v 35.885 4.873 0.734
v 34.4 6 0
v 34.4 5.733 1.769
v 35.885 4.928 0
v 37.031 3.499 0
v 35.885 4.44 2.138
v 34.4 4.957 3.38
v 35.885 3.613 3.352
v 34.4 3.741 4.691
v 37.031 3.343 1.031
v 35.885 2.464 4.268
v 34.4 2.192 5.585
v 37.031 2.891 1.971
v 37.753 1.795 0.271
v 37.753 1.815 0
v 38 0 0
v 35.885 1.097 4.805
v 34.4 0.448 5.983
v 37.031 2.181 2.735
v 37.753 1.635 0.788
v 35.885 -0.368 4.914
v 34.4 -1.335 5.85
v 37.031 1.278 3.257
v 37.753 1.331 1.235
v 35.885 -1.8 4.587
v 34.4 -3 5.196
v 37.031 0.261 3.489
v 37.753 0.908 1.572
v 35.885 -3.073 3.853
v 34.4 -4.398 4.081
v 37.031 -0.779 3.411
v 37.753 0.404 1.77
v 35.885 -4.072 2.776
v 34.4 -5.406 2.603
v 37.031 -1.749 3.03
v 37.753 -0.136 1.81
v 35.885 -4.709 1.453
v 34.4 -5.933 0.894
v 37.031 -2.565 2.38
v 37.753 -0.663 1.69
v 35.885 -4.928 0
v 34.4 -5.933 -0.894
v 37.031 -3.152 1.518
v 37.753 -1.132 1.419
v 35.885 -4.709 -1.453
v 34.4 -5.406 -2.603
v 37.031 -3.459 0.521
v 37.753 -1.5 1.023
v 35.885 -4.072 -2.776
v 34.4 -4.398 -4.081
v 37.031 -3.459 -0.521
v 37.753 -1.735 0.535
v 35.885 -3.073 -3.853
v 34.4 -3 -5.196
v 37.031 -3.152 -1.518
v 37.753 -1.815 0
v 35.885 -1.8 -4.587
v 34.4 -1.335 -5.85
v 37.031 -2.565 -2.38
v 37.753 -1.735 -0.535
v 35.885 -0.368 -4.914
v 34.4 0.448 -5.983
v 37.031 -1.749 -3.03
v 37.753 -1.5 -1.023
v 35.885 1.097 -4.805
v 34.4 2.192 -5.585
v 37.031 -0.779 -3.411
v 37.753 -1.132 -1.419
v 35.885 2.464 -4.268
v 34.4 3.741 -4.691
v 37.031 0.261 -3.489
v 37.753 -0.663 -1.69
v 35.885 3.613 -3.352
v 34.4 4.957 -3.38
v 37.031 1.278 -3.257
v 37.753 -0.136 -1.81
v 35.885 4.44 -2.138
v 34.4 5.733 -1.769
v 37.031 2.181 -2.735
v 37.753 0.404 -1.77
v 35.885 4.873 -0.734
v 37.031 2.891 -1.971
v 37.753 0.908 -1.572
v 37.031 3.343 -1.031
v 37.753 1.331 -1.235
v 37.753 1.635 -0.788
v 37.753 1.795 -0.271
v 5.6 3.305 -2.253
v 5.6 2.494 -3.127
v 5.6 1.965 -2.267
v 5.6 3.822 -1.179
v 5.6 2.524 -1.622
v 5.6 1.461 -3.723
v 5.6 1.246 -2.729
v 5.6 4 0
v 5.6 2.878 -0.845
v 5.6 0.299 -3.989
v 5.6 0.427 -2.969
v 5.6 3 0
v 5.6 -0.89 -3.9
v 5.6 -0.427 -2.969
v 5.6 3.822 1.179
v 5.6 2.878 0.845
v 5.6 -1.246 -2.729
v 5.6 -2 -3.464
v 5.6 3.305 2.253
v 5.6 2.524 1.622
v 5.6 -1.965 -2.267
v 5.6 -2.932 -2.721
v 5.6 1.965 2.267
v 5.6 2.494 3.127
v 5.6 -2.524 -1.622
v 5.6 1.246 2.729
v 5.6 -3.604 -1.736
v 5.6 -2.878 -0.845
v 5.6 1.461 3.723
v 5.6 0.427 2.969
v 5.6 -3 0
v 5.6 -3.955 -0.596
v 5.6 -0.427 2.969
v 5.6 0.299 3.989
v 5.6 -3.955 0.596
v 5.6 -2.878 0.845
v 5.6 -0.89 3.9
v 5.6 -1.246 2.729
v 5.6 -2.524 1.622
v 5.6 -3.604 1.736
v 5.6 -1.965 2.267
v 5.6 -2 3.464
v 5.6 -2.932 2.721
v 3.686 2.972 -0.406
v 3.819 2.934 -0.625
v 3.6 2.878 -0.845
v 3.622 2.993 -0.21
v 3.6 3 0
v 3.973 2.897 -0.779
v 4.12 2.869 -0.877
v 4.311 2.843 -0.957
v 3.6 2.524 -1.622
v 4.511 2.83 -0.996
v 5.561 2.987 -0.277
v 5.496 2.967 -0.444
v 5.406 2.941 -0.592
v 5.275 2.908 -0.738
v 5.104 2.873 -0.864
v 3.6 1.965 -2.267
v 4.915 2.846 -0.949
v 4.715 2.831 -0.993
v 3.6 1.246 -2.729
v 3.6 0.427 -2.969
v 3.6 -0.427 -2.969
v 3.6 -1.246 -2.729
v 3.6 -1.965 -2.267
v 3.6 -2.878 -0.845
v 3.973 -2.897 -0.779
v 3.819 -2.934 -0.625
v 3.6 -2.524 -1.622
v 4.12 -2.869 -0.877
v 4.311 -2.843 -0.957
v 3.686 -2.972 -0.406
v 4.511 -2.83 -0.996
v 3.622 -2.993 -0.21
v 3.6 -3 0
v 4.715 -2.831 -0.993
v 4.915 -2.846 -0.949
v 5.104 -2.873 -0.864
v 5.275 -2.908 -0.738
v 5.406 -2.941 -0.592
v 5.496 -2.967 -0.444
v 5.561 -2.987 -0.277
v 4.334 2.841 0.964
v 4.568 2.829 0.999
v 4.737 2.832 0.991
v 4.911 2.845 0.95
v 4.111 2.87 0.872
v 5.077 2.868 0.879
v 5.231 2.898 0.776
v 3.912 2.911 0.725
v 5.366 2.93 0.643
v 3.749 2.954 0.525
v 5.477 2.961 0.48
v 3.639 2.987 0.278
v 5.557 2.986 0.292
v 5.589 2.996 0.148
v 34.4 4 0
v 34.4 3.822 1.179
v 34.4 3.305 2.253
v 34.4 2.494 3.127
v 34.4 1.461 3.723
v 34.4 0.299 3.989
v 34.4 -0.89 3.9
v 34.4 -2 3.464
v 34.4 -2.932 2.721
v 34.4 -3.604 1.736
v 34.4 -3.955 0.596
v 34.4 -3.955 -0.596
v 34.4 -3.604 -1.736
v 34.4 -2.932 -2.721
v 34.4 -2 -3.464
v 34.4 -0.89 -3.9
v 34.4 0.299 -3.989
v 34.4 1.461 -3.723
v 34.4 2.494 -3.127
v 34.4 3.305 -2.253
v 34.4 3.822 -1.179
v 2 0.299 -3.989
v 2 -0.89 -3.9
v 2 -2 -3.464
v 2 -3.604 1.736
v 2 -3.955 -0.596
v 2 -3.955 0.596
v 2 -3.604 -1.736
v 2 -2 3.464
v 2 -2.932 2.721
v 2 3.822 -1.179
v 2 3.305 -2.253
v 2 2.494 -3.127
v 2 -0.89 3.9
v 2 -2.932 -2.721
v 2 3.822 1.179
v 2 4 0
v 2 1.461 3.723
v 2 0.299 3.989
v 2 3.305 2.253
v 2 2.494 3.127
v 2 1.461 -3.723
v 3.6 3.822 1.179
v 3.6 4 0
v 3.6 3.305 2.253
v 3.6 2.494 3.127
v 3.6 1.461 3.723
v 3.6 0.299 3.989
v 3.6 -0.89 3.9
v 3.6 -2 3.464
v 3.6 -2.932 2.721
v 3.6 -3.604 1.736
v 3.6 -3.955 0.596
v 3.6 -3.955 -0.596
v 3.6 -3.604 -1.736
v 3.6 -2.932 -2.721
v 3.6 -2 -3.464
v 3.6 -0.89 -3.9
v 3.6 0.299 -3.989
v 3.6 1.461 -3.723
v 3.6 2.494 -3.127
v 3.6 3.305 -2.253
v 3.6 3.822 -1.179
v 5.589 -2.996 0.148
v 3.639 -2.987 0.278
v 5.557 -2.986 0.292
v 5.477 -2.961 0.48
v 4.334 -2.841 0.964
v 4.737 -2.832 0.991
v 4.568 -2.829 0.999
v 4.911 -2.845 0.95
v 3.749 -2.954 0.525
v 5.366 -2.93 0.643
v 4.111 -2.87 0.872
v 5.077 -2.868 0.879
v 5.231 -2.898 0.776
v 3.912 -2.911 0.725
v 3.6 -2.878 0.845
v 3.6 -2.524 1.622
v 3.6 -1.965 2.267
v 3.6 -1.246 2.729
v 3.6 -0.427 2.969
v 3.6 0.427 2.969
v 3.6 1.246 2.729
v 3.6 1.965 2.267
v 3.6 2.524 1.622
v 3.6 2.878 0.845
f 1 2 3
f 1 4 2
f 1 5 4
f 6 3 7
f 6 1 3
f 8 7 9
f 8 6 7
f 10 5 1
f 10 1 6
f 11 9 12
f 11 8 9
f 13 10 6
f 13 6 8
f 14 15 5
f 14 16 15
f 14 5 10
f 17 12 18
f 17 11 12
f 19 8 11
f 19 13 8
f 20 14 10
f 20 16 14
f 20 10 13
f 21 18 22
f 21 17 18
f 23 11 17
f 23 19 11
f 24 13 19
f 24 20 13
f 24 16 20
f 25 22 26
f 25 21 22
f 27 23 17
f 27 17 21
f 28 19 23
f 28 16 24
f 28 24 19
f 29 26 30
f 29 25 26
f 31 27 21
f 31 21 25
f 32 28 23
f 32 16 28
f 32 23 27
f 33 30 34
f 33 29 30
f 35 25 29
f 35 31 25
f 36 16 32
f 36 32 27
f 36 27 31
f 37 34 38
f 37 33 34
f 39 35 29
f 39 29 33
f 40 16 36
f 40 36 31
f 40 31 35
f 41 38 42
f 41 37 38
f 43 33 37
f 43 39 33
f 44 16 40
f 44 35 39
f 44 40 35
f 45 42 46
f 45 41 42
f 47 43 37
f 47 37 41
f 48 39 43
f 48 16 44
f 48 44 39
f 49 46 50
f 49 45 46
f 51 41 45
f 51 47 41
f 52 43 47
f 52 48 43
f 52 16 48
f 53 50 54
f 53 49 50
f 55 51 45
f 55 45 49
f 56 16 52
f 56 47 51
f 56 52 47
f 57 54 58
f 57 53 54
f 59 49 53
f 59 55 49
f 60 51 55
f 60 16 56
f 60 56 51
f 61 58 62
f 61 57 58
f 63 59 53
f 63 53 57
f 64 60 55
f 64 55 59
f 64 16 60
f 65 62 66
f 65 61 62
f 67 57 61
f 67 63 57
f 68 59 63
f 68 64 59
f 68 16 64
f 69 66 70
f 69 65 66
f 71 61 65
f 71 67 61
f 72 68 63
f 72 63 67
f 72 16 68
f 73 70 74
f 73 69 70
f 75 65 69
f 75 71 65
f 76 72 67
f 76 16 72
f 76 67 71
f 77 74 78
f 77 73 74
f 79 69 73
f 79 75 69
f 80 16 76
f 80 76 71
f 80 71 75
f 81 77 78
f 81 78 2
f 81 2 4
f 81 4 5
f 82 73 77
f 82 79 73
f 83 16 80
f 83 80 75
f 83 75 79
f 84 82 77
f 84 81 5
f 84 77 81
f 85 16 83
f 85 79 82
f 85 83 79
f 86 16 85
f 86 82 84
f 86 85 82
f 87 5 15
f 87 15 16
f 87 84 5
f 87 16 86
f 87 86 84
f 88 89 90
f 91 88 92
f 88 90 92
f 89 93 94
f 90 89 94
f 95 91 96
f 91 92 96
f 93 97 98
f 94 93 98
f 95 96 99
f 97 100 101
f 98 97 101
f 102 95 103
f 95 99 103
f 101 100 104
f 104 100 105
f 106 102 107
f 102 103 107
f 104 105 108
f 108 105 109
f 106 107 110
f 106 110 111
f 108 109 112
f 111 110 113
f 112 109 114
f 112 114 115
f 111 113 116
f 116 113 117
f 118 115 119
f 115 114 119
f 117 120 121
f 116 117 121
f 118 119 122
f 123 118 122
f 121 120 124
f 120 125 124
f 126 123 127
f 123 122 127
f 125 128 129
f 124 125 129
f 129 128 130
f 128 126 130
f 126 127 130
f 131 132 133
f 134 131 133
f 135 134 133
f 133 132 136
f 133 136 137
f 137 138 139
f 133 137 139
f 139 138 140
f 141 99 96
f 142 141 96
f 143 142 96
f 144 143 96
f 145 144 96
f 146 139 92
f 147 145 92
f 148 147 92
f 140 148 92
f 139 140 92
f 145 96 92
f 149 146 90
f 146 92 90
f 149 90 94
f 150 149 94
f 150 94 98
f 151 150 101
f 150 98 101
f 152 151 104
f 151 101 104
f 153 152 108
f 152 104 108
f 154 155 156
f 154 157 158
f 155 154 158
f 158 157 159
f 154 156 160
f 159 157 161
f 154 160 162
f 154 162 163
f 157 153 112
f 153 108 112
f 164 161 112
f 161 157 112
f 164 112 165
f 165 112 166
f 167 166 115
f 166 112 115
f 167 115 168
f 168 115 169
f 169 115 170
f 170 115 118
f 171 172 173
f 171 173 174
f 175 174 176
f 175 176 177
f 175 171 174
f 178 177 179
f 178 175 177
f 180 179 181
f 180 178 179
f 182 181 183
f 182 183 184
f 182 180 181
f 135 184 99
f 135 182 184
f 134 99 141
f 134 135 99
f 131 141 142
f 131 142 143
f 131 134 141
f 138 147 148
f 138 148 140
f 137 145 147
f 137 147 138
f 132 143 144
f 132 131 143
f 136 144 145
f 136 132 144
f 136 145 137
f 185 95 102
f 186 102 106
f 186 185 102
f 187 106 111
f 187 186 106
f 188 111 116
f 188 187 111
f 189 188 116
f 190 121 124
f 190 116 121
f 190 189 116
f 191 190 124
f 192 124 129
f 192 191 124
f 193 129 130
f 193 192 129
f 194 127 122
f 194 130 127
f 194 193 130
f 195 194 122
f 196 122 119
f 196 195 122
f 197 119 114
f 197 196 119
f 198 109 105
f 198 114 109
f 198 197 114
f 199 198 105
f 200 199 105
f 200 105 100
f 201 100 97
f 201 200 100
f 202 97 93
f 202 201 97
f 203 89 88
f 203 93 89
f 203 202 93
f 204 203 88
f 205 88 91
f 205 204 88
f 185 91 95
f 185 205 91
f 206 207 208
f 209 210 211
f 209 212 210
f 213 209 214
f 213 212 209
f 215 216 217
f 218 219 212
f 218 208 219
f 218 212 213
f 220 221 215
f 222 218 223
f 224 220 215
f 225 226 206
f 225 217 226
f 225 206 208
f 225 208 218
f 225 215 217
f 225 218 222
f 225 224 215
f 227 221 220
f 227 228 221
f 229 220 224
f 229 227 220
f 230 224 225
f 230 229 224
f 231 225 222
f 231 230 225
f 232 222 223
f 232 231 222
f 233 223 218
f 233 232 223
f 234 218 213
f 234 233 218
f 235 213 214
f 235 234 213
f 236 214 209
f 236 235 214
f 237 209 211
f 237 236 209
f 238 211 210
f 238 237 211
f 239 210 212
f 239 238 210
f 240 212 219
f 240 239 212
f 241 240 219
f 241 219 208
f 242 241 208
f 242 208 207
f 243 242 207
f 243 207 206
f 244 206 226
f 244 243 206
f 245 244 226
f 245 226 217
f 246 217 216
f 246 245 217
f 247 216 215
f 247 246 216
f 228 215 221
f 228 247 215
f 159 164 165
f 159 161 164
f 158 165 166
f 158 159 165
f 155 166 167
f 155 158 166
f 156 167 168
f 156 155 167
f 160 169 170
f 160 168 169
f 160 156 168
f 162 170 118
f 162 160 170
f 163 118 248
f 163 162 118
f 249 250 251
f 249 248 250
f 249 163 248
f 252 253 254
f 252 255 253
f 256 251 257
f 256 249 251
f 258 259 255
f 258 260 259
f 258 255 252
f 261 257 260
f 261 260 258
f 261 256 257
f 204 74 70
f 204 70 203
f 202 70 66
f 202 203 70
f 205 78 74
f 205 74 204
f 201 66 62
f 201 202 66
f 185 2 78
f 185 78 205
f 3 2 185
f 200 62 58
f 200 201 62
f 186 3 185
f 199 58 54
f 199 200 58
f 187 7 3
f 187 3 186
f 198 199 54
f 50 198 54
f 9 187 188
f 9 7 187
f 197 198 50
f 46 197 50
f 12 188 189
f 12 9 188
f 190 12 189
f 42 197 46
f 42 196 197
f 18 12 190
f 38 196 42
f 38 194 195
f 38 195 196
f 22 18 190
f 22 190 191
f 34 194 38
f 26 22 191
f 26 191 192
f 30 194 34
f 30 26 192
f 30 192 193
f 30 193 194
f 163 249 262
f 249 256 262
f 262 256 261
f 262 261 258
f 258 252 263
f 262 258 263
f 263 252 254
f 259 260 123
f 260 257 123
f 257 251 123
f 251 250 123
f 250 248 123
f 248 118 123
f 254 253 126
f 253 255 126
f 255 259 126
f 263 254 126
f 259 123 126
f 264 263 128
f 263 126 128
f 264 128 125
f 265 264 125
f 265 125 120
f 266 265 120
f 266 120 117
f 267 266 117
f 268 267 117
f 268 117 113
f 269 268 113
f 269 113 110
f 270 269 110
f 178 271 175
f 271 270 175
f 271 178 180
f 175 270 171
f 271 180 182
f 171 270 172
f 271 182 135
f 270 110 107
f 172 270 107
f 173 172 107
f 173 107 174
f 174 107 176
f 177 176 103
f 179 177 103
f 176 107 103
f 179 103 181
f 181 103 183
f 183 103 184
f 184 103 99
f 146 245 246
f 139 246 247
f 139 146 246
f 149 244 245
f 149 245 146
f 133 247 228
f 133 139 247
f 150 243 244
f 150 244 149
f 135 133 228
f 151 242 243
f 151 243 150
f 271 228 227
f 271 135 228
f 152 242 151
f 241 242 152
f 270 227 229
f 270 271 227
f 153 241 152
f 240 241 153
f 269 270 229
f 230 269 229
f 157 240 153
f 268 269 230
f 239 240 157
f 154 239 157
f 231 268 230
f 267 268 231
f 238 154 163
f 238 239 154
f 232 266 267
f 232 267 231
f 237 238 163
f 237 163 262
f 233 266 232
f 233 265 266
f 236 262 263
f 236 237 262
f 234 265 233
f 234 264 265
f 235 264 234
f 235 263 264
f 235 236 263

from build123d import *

# Parameters (mm, degrees)
SKETCH2_R               = 1
CUT_EXTRUDE1_DEPTH      = 7
CUT_EXTRUDE1_DEPTH_BACK = 7
SKETCH3_W               = 2
SKETCH3_H               = 1
SKETCH4_R               = 4
CUT_EXTRUDE2_DEPTH      = 2
SKETCH5_R               = 3
BOSS_EXTRUDE1_DEPTH     = 32.4


with BuildPart() as part:
    # Sketch1 → Revolve1 (revolve)
    with BuildSketch(Plane.XY):
        with BuildLine():
            Line((0, 4), (34.4, 4))
            Line((34.4, 4), (34.4, 6))
            ThreePointArc((34.4, 6), (37.030951895, 3.498571137), (38, 0))
            Line((38, 0), (0, 0))
            Line((0, 0), (0, 4))
        make_face()
    revolve(axis=Axis((0, 0, 0), (1, 0, 0)))

    # Sketch2 → Cut-Extrude1 (cut, two sides)
    with BuildSketch(Plane(origin=(0, 0, 0), x_dir=(1, 0, 0), z_dir=(0, 1, 0))) as cut_extrude1_sk:
        with Locations((4.6, 0)):
            Circle(SKETCH2_R)
    extrude(amount=CUT_EXTRUDE1_DEPTH, mode=Mode.SUBTRACT)
    extrude(cut_extrude1_sk.sketch, amount=-CUT_EXTRUDE1_DEPTH_BACK, mode=Mode.SUBTRACT)

    # Sketch3 → Cut-Revolve1 (revolve, cut)
    with BuildSketch(Plane(origin=(0, 0, 0), x_dir=(1, 0, 0), z_dir=(0, 1, 0))):
        with Locations((4.6, 3.5)):
            Rectangle(SKETCH3_W, SKETCH3_H)
    revolve(axis=Axis((34.4, 0, 0), (-1, 0, 0)), mode=Mode.SUBTRACT)

    # Sketch4 → Cut-Extrude2 (cut)
    with BuildSketch(Plane.ZY):
        Circle(SKETCH4_R)
    extrude(amount=-CUT_EXTRUDE2_DEPTH, mode=Mode.SUBTRACT)

    # Sketch5 → Boss-Extrude1 (add)
    with BuildSketch(Plane.ZY.offset(-2)):
        Circle(SKETCH5_R)
    extrude(amount=-BOSS_EXTRUDE1_DEPTH)


solid = part.part
